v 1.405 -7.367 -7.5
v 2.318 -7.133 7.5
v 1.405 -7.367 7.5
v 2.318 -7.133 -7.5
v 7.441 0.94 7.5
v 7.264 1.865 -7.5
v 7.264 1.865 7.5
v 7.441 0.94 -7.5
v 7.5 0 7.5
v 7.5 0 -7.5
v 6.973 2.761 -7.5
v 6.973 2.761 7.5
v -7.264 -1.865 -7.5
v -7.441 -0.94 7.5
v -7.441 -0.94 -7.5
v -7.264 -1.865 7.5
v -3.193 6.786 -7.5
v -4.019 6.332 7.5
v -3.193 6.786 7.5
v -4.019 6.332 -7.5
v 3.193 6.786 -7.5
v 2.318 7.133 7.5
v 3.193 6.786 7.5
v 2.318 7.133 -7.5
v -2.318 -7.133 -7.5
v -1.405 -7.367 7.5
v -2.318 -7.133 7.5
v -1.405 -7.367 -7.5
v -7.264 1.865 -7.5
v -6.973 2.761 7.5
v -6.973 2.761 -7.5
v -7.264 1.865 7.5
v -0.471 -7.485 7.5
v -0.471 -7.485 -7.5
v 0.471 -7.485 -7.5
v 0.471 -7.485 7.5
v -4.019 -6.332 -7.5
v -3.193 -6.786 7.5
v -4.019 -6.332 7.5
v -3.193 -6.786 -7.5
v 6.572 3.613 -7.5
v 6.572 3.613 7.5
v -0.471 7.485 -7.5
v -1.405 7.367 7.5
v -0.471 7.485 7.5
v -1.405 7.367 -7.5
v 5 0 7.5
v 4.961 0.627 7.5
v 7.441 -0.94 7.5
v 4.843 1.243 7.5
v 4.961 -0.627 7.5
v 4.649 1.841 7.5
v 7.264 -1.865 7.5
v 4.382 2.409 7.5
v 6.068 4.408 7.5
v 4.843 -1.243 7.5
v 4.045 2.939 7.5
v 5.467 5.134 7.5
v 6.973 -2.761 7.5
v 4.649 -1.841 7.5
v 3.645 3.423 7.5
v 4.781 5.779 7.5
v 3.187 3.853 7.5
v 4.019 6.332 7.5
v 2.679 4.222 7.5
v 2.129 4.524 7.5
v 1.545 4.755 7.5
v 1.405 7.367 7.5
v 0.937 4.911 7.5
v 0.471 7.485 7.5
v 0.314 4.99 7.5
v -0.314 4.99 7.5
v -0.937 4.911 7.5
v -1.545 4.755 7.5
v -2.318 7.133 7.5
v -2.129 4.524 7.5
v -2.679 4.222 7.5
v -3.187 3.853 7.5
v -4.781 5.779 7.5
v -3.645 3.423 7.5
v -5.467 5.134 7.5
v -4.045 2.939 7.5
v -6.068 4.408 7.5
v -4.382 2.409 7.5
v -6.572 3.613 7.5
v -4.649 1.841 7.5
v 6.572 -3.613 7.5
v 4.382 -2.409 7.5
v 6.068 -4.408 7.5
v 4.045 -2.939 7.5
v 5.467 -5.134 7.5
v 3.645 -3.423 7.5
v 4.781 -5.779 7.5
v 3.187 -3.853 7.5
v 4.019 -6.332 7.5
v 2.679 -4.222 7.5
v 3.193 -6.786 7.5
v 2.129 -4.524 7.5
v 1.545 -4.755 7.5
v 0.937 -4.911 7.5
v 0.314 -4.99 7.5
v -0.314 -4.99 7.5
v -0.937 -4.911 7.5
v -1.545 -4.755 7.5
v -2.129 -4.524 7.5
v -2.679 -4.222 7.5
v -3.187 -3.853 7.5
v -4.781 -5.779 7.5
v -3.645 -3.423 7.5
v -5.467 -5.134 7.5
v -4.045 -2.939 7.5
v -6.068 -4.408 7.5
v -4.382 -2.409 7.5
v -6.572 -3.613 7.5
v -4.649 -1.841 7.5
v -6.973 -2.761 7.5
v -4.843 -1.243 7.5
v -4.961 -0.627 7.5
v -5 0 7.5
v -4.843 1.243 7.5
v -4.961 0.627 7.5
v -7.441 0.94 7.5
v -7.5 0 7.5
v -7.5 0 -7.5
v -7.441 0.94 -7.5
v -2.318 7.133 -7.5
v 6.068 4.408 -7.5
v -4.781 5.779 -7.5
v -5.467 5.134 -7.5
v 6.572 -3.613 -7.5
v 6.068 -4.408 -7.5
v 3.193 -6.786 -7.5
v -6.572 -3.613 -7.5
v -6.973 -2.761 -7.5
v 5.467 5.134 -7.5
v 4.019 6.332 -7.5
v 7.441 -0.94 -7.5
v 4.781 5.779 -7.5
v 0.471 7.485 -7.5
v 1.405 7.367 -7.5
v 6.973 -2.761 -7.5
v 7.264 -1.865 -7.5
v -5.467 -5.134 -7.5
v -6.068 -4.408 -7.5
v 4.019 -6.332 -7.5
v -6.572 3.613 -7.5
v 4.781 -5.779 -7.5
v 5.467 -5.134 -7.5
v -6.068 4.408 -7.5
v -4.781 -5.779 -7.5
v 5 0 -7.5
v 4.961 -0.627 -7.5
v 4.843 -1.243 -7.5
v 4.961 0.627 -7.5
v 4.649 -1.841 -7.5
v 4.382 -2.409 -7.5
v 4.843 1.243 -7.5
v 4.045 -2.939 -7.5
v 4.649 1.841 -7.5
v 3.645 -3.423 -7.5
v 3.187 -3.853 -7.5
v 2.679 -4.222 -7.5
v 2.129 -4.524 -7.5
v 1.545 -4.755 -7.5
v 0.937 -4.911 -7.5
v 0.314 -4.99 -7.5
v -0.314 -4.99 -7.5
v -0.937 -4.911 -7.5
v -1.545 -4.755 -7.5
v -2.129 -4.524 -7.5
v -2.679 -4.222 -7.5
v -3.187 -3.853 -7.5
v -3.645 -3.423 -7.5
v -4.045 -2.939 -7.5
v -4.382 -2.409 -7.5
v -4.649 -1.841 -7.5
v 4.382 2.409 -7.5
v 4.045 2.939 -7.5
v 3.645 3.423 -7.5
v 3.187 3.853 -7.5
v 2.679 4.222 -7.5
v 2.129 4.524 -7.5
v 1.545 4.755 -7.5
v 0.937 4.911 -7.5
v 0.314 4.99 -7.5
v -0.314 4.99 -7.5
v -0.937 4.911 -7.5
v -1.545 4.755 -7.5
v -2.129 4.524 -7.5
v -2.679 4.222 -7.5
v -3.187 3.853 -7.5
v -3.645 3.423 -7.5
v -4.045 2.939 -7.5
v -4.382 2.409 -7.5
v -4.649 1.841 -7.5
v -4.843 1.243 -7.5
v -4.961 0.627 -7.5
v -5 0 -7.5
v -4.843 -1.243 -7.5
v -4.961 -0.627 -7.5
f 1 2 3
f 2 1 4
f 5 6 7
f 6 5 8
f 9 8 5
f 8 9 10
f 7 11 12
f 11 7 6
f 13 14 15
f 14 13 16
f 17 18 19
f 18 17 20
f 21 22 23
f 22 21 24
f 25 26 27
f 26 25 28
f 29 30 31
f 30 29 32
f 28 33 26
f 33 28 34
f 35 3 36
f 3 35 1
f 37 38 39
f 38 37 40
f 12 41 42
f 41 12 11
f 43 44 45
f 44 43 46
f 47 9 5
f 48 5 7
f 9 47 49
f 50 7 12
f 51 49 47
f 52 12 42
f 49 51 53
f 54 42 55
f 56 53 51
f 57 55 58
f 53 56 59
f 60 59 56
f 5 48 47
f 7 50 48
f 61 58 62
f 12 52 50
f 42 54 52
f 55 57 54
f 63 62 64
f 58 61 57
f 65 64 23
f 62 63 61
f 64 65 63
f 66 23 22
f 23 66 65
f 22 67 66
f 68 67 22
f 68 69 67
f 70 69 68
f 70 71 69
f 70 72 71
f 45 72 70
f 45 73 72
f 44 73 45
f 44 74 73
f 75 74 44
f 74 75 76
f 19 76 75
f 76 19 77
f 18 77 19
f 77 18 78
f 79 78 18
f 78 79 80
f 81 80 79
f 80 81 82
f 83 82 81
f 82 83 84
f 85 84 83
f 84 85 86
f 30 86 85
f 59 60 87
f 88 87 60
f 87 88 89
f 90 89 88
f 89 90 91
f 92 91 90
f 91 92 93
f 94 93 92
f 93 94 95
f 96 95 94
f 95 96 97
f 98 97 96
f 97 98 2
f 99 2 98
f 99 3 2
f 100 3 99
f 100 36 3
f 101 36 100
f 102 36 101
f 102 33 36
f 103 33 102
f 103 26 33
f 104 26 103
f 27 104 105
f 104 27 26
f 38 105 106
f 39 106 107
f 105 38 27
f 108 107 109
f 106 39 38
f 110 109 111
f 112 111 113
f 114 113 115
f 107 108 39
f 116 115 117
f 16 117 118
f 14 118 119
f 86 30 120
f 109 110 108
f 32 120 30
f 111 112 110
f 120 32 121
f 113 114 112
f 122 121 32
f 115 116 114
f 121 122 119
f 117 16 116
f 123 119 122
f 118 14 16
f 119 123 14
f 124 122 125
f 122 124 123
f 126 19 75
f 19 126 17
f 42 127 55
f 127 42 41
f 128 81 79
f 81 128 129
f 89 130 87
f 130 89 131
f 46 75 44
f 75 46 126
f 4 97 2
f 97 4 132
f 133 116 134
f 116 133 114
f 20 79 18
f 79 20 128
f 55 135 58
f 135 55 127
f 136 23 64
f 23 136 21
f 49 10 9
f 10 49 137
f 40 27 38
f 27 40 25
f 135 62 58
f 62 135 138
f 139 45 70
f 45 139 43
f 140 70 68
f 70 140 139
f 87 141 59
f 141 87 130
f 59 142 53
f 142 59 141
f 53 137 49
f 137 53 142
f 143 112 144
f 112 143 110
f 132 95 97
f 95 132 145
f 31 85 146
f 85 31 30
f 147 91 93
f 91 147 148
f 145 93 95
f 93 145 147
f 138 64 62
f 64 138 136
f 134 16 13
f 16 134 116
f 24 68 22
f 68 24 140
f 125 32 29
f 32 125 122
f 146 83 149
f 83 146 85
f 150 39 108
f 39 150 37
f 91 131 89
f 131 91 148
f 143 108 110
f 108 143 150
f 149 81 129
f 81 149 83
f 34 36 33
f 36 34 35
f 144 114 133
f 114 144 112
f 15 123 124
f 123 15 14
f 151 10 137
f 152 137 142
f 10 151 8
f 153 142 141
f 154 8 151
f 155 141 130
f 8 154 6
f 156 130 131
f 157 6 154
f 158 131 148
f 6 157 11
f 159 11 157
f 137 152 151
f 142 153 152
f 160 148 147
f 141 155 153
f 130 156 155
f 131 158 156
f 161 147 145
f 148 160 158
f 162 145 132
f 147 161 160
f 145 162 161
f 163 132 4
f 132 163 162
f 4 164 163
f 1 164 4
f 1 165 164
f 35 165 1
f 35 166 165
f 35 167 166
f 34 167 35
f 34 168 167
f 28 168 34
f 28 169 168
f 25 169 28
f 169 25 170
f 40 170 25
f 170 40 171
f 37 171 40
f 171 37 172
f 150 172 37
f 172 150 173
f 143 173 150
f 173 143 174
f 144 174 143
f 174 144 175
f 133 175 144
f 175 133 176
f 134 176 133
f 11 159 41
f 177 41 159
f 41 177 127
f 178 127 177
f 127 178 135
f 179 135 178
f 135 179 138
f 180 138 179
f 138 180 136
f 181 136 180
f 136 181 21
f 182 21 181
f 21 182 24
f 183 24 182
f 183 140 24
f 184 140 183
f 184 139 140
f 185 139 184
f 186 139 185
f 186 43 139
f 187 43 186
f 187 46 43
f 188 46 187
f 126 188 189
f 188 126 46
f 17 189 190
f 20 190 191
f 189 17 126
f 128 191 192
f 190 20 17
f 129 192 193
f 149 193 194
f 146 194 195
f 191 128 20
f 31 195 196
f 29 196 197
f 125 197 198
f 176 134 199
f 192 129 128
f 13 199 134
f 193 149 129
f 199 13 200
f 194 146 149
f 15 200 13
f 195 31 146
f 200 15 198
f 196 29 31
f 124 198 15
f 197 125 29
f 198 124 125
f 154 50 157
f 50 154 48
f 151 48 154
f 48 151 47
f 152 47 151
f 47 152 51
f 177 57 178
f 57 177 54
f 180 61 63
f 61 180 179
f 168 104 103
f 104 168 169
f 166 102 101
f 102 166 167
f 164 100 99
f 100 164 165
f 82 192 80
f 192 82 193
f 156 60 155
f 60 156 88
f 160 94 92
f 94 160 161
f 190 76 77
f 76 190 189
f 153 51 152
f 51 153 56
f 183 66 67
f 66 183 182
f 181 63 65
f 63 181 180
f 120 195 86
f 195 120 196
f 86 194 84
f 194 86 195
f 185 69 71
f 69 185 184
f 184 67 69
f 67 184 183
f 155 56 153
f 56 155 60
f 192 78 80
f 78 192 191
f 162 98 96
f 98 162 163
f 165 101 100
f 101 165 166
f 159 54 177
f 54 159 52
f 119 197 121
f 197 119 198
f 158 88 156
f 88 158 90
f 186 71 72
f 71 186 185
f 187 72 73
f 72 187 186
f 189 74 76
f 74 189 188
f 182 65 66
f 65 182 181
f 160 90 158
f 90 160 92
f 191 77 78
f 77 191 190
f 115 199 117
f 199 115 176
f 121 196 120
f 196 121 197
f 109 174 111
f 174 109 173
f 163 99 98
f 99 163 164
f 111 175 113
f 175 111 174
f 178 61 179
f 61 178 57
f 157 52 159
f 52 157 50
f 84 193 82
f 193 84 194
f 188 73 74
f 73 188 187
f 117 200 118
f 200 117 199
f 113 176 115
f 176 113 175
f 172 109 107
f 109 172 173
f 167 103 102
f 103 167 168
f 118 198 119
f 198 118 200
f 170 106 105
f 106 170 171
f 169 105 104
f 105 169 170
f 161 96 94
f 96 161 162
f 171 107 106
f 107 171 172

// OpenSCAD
$fn = 50;


difference() {
	union() {
		translate(v = [0, 0, -7.5000000000]) {
			cylinder(h = 15, r = 7.5000000000);
		}
	}
	union() {
		translate(v = [0, 0, -100.0000000000]) {
			cylinder(h = 200, r = 5.0000000000);
		}
	}
}
